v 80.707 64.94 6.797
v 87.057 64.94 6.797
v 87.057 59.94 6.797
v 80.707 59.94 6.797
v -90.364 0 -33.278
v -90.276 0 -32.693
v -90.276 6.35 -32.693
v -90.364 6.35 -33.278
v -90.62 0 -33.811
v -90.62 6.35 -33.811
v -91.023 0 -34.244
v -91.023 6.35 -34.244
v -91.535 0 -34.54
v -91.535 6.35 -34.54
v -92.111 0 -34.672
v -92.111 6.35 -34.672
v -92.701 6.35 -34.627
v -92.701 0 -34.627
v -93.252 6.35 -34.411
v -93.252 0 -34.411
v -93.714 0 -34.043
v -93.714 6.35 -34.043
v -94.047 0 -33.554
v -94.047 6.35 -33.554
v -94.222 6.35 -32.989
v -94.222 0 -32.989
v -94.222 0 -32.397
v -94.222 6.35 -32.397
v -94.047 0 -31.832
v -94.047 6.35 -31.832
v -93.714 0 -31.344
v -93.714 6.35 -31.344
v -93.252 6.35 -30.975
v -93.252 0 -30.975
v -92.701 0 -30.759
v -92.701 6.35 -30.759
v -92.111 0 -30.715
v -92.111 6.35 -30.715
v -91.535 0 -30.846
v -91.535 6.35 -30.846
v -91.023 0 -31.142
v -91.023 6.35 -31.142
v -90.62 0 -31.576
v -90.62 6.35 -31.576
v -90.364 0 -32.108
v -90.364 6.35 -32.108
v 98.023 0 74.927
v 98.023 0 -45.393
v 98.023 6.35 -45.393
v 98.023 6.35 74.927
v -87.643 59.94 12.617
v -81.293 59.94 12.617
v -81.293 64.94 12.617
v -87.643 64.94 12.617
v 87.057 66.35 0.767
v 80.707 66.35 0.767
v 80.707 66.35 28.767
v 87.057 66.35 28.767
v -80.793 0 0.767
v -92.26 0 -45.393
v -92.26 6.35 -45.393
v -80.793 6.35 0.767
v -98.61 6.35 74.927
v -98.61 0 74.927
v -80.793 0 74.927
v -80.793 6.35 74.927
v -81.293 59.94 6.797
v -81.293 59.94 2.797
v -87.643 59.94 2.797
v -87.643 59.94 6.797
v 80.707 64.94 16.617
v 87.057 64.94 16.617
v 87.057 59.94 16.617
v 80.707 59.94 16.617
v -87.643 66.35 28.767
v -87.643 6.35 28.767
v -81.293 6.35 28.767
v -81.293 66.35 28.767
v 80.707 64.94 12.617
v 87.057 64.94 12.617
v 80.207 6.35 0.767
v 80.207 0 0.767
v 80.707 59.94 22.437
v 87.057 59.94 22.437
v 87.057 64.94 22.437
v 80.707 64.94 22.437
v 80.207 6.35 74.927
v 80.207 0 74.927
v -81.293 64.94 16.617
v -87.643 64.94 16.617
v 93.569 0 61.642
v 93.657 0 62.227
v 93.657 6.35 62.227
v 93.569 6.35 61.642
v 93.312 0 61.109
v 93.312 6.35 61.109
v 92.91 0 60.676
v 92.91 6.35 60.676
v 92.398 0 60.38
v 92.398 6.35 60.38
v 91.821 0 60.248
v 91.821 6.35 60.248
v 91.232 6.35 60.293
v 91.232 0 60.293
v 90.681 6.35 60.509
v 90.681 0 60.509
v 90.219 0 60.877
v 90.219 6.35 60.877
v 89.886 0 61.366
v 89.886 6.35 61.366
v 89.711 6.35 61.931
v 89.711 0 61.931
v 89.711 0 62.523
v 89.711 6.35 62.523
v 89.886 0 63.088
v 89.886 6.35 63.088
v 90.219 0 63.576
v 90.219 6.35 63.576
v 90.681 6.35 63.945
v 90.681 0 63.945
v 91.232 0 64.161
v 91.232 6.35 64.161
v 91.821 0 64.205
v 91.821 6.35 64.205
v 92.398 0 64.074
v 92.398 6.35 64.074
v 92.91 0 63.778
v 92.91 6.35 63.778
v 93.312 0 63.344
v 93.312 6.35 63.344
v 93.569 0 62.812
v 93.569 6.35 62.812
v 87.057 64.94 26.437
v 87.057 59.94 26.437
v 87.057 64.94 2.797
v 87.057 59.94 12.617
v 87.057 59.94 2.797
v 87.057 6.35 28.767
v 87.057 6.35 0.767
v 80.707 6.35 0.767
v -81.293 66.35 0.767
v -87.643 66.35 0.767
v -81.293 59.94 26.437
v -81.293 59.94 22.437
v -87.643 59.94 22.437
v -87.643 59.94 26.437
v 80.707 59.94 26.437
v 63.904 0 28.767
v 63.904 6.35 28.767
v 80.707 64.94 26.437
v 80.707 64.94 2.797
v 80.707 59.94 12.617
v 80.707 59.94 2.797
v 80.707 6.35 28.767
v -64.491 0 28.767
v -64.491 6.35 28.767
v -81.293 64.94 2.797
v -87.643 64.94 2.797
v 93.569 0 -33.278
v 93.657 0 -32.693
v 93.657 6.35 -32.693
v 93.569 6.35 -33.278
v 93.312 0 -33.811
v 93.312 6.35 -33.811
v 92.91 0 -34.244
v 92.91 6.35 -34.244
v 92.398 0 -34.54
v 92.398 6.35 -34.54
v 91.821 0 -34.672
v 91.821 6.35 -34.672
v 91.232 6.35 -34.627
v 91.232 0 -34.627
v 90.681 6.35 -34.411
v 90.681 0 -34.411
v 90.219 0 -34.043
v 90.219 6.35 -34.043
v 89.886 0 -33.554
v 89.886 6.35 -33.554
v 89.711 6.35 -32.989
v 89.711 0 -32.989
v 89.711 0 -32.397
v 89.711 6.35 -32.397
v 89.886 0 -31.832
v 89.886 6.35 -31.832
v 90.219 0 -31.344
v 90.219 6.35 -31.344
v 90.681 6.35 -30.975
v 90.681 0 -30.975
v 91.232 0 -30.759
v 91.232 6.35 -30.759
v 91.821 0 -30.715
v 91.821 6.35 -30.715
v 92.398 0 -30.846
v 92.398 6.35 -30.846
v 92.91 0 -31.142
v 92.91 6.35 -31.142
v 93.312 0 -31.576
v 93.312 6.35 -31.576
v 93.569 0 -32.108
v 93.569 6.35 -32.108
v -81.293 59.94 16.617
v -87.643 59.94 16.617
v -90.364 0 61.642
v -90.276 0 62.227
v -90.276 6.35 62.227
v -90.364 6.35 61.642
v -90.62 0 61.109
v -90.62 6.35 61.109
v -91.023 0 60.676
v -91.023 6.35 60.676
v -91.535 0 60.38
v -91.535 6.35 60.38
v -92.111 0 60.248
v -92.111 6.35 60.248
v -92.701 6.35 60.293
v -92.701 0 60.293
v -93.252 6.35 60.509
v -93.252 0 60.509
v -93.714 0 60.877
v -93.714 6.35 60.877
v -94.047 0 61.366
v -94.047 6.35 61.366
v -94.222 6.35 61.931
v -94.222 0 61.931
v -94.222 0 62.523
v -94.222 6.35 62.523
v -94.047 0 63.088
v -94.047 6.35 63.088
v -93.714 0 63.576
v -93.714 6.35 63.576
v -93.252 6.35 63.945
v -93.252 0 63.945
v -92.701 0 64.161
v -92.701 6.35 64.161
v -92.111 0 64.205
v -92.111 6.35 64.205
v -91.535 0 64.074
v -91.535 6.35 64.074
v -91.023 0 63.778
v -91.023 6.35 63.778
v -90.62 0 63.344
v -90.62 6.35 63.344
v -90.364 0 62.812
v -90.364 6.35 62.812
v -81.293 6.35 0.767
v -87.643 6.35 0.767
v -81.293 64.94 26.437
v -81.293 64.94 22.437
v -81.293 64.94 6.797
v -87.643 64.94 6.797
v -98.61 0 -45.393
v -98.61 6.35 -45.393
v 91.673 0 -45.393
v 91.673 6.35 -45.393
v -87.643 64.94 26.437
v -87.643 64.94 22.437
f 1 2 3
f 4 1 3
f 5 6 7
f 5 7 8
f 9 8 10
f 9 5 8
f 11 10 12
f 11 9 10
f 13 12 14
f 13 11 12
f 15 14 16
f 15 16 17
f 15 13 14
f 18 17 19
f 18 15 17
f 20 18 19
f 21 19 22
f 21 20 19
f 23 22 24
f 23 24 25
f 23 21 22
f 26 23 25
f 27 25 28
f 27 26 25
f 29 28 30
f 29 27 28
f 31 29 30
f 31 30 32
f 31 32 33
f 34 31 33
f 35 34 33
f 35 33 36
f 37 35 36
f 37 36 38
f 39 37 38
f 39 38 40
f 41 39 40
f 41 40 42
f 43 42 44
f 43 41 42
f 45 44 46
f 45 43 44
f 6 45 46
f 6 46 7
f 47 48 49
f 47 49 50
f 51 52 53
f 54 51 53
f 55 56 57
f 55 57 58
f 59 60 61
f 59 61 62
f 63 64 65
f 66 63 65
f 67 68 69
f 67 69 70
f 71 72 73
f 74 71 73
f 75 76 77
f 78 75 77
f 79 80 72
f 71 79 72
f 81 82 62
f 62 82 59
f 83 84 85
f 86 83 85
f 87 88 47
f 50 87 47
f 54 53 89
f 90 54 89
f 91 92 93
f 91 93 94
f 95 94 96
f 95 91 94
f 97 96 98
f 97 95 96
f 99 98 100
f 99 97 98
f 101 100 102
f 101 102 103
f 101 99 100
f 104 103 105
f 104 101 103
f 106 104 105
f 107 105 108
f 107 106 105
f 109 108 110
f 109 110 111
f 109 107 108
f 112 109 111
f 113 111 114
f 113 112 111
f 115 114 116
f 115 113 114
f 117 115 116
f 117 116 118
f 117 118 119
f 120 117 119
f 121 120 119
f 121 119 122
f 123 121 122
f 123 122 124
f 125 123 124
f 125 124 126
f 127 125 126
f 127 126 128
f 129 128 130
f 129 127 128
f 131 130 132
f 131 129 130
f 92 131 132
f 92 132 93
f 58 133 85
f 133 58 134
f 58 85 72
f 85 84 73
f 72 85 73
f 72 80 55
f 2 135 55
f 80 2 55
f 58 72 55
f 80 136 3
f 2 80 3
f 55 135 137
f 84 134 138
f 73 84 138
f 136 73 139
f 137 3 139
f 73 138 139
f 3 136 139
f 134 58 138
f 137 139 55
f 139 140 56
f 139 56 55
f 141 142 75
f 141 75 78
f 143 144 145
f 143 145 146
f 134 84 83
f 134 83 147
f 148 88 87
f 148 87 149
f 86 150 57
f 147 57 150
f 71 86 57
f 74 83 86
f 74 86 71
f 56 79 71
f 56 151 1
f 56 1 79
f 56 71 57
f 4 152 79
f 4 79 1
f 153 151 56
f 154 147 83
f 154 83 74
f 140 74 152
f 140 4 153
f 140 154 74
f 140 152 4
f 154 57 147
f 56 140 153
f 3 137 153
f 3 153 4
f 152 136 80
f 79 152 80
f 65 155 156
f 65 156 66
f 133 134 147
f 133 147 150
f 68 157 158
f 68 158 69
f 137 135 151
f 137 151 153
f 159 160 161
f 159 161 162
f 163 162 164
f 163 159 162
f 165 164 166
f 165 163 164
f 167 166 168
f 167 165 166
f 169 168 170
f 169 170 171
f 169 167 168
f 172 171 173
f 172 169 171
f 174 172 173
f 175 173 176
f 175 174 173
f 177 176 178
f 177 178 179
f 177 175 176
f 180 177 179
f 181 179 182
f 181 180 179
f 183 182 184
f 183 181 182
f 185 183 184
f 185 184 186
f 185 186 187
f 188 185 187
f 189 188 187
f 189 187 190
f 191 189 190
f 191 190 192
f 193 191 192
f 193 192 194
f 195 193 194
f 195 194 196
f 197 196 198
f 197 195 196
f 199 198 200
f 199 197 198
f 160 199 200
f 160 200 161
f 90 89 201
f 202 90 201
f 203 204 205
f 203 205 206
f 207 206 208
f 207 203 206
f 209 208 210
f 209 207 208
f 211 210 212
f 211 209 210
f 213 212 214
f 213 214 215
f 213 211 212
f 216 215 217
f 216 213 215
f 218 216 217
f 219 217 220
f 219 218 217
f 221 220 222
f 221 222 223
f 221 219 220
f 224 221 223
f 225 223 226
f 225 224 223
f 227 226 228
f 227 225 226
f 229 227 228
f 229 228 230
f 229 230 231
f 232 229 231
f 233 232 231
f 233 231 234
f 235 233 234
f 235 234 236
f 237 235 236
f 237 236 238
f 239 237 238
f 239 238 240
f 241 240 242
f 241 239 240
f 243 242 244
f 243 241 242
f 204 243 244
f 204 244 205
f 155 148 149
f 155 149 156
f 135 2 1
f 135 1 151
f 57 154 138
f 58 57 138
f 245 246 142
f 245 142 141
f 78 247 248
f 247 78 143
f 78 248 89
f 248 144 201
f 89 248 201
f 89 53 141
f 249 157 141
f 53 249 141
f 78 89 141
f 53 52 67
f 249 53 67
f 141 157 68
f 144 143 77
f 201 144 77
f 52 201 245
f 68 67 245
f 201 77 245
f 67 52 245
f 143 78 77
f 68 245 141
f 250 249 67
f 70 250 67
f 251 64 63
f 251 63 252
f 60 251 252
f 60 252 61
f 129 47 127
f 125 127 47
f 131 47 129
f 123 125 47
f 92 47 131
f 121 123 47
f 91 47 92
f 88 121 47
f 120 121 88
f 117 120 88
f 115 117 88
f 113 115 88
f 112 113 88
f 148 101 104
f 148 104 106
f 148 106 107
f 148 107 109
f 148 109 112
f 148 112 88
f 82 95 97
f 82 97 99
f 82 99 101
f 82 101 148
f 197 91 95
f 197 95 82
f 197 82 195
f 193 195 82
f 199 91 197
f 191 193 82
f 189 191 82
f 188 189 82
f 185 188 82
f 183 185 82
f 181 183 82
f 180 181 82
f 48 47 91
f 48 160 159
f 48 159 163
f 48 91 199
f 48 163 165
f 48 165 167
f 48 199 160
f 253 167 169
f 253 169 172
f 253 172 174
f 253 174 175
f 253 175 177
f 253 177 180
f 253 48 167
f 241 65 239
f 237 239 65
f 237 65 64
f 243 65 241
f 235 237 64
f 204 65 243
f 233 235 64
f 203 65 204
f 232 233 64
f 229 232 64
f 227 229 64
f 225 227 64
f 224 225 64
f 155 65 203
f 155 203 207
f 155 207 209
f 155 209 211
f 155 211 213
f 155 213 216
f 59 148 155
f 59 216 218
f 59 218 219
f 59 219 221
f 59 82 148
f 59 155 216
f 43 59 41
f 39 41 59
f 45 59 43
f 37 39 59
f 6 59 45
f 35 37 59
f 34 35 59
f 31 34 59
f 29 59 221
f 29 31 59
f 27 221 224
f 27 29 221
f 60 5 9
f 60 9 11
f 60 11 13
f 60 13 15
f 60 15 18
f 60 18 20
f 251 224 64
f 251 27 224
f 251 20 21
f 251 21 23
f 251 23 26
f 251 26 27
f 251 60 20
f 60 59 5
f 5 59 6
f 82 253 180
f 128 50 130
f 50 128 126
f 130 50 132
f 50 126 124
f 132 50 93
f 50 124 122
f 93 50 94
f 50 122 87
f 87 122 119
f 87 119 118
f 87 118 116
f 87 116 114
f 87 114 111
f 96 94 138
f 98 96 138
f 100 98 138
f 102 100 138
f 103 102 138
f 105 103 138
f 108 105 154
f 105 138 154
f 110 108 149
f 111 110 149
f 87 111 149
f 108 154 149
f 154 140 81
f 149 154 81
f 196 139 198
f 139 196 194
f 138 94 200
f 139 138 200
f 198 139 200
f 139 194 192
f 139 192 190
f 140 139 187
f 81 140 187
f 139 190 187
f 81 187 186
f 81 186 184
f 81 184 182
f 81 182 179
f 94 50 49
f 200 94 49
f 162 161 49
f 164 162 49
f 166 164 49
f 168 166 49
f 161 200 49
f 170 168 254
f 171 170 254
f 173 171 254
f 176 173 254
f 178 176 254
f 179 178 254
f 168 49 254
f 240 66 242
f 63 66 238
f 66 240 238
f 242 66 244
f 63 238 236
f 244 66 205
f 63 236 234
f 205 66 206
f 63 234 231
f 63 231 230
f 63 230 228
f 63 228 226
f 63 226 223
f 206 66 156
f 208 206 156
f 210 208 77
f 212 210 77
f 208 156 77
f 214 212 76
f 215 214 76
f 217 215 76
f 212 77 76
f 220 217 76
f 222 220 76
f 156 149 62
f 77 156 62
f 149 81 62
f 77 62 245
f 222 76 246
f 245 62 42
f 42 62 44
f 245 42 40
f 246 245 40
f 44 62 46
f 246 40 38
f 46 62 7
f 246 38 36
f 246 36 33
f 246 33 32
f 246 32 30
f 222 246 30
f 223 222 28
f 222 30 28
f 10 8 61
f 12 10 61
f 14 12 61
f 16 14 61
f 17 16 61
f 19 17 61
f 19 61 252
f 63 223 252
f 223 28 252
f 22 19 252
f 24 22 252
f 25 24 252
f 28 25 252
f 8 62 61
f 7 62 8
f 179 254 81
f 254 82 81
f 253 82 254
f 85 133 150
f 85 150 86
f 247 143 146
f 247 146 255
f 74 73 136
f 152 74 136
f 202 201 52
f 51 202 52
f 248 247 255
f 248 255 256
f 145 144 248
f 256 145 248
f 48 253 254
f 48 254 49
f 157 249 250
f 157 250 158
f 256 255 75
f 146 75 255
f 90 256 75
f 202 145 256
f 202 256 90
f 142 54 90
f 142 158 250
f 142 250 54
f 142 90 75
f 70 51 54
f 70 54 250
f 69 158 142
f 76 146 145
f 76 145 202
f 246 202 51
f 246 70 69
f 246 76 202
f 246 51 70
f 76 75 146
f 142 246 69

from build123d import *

# Parameters (mm, degrees)
SKETCH_1_R          = 1.984
EXTRUDE_1_DEPTH     = 6.35
SKETCH_2_W          = 6.35
SKETCH_2_H          = 28
EXTRUDE_2_DEPTH     = 60
CUT_EXTRUDE_1_DEPTH = 250


with BuildPart() as part:
    # 草图1 → 凸台-拉伸1 (new body)
    with BuildSketch(Plane(origin=(0, 0, 0), x_dir=(1, 0, 0), z_dir=(0, 1, 0))):
        Polygon((98.023064942, -74.926838383), (91.673064942, -74.926838383), (80.206659609, -74.926838383), (63.904311177, -28.766838383), (-64.490991959, -28.766838383), (-80.793340391, -74.926838383), (-92.259745724, -74.926838383), (-98.609745724, -74.926838383), (-98.609745724, 45.393161617), (-92.259745724, 45.393161617), (-80.793340391, -0.766838383), (-64.490991959, -0.766838383), (63.904311177, -0.766838383), (80.206659609, -0.766838383), (91.673064942, 45.393161617), (98.023064942, 45.393161617), align=None)
        with Locations((91.673064942, -62.226838383)):
            Circle(SKETCH_1_R, mode=Mode.SUBTRACT)
        with Locations((91.673064942, 32.693161617)):
            Circle(SKETCH_1_R, mode=Mode.SUBTRACT)
        with Locations((-92.259745724, -62.226838383)):
            Circle(SKETCH_1_R, mode=Mode.SUBTRACT)
        with Locations((-92.259745724, 32.693161617)):
            Circle(SKETCH_1_R, mode=Mode.SUBTRACT)
    extrude(amount=EXTRUDE_1_DEPTH)

    # 草图2 → 凸台-拉伸2 (add)
    with BuildSketch(Plane(origin=(0, 6.35, 0), x_dir=(1, 0, 0), z_dir=(0, 1, 0))):
        with Locations((-84.468340391, -14.766838383)):
            Rectangle(SKETCH_2_W, SKETCH_2_H)
        with Locations((83.881659609, -14.766838383)):
            Rectangle(SKETCH_2_W, SKETCH_2_H)
    extrude(amount=EXTRUDE_2_DEPTH)

    # 草图3 → 切除-拉伸1 (cut)
    with BuildSketch(Plane(origin=(87.056659609, 0, 0), x_dir=(0, 0, -1), z_dir=(1, 0, 0))):
        Polygon((-22.436838383, 62.44), (-22.436838383, 59.94), (-26.436838383, 59.94), (-26.436838383, 64.94), (-22.436838383, 64.94), align=None)
        Polygon((-16.616838383, 62.44), (-16.616838383, 59.94), (-12.616838383, 59.94), (-12.616838383, 64.94), (-16.616838383, 64.94), align=None)
        Polygon((-6.796838383, 62.44), (-6.796838383, 64.94), (-2.796838383, 64.94), (-2.796838383, 59.94), (-6.796838383, 59.94), align=None)
    extrude(amount=-CUT_EXTRUDE_1_DEPTH, mode=Mode.SUBTRACT)


solid = part.part
